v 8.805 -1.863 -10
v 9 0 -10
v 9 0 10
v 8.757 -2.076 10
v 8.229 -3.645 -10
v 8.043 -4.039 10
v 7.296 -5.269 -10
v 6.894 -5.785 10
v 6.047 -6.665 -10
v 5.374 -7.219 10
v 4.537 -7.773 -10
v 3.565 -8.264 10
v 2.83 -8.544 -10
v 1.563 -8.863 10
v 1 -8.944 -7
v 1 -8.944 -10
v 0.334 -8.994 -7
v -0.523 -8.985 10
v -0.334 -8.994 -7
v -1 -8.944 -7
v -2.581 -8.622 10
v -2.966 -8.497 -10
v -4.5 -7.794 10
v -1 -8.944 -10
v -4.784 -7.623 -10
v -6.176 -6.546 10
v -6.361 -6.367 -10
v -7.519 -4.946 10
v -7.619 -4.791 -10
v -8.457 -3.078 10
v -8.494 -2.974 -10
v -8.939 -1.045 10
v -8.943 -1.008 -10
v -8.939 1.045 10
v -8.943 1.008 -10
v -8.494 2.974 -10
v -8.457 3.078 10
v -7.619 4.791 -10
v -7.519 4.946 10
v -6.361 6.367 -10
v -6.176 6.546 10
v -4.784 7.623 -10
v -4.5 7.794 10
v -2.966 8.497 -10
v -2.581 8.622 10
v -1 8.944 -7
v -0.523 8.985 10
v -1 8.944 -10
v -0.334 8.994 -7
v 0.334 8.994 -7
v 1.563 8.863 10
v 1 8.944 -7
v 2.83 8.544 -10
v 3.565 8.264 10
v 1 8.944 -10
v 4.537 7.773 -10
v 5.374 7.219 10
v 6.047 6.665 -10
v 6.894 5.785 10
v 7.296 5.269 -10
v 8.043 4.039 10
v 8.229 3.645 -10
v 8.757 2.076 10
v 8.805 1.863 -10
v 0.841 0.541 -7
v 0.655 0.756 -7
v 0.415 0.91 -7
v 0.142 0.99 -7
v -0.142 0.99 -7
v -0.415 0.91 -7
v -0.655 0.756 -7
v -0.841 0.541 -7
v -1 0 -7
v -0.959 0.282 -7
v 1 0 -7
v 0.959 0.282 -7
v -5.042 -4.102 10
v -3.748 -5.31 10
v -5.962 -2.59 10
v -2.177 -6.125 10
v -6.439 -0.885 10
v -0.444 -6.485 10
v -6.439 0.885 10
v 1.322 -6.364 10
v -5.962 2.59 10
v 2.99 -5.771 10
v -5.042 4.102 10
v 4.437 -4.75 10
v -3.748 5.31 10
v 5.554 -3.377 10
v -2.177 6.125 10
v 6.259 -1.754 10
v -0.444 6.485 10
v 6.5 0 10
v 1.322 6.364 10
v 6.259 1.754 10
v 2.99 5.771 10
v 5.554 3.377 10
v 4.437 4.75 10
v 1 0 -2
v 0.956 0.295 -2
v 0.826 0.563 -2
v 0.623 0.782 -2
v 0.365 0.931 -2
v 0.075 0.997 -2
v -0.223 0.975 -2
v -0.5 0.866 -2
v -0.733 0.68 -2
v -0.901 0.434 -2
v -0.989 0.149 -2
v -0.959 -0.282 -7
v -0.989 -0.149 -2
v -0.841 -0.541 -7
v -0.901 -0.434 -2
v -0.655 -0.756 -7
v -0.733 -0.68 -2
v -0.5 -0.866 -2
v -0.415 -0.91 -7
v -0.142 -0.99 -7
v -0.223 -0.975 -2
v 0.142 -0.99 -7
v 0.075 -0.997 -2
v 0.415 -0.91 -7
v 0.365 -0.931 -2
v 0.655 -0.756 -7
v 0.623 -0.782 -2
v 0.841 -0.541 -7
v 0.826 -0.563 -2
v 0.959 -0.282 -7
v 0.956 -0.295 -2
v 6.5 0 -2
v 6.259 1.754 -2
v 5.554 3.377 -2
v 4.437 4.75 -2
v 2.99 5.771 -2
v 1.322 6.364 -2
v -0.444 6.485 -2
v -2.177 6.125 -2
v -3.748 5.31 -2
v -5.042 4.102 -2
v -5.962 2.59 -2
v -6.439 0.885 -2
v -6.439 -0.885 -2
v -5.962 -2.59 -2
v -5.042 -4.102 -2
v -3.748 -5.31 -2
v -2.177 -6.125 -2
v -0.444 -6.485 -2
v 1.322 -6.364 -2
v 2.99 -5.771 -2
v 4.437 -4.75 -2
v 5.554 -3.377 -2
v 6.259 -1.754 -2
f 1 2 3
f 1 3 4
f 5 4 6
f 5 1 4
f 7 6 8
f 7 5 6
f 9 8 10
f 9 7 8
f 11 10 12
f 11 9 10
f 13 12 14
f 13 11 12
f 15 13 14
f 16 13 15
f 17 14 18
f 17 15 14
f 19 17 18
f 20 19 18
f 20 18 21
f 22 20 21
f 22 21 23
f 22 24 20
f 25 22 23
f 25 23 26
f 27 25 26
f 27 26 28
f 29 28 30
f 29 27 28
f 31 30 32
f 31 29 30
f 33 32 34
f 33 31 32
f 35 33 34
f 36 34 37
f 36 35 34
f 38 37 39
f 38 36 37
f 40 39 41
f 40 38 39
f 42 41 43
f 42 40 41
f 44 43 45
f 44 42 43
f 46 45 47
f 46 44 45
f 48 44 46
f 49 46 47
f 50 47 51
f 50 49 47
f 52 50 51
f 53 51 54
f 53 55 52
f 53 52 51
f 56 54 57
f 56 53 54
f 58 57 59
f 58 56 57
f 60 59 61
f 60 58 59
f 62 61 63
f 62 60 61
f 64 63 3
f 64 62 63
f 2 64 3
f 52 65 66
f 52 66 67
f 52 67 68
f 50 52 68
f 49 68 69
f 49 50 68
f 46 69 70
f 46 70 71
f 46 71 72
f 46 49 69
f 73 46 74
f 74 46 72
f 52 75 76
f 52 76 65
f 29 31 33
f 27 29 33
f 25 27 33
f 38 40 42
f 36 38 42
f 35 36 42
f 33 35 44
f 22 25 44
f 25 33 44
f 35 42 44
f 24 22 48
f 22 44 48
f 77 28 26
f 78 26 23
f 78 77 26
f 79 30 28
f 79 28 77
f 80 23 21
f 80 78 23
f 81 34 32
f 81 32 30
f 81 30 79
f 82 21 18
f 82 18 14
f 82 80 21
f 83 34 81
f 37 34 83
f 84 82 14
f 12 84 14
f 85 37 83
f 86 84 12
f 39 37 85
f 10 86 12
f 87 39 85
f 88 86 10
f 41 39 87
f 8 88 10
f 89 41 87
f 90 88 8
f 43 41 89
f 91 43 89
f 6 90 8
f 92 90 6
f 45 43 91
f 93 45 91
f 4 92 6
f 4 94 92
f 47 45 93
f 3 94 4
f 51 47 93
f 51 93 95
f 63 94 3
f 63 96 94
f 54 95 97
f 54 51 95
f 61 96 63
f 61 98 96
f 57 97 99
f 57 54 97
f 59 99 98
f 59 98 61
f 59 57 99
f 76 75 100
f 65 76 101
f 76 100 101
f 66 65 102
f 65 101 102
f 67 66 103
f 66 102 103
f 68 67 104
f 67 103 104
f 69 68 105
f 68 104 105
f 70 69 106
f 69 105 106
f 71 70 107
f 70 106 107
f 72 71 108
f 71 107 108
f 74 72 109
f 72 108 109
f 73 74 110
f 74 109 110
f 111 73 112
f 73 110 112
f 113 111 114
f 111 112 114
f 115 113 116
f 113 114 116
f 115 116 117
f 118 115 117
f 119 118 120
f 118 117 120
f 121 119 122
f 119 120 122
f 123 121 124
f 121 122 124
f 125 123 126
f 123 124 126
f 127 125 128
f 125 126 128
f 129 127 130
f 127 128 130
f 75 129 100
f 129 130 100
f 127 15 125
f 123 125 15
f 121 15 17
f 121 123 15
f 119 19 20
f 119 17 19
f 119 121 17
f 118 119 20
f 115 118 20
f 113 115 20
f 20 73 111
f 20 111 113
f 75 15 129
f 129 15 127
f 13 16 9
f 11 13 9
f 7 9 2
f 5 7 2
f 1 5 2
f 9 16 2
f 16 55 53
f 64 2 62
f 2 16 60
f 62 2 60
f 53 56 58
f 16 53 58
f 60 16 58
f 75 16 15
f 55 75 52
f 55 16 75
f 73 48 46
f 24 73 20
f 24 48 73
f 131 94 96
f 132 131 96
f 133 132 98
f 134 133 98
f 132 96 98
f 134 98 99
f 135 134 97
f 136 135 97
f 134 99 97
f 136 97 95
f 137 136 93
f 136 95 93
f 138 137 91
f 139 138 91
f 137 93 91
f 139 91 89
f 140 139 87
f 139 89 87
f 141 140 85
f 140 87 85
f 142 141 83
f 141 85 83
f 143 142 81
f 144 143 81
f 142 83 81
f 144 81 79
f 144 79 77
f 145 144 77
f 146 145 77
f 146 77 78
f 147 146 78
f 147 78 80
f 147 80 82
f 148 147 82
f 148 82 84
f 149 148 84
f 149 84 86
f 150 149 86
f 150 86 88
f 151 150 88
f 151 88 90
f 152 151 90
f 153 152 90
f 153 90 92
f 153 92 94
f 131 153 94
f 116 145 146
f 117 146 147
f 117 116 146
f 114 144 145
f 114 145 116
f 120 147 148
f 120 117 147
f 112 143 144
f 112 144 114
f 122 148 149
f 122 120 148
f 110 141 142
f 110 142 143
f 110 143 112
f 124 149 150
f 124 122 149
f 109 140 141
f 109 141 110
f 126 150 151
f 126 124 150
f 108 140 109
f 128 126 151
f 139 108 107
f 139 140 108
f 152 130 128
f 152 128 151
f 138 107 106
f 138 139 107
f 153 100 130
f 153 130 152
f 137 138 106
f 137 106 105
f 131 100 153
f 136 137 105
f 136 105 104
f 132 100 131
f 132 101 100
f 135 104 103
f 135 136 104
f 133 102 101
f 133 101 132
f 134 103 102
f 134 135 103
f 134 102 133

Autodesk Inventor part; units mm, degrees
ref_plane "YZ Plane" through (0, 0, 0) normal (1, 0, 0) x (0, 1, 0)
ref_plane "XZ Plane" through (0, 0, 0) normal (0, 1, 0) x (-1, 0, 0)
ref_plane "XY Plane" through (0, 0, 0) normal (0, 0, 1) x (1, 0, 0)
sketch "スケッチ1" plane through (0, 0, 0) normal (0, 0, 1) x (1, 0, 0)
  circle A0 centre (0, 0) radius 9
  circle A1 centre (0, 0) radius 1
  dimension "d0" = 18
  dimension "d3" = 2
extrude "押し出し1" add sketch "スケッチ1" along normal mid plane 20
sketch "スケッチ2" plane through (0, 0, -10) normal (0, 0, -1) x (-1, 0, 0)
  line L0 (-1, 10.2383) -> (1, 10.2383)
  line L1 (1, 10.2383) -> (1, -10.4548)
  line L2 (1, -10.4548) -> (-1, -10.4548)
  line L3 (-1, -10.4548) -> (-1, 10.2383)
  point P0 (0, 0)
  point P1 (0, -10.4548)
  dimension "d4" = 2
extrude "押し出し2" cut sketch "スケッチ2" against normal blind 3
thread "ねじ1" size "M20x2" class "6g" standard "ISO Metric profile" full length
sketch "スケッチ3" plane through (0, 0, 10) normal (0, 0, 1) x (1, 0, 0)
  point P0 (0, 0)
sketch "スケッチ4" plane through (0, 0, 10) normal (0, 0, 1) x (1, 0, 0)
  circle A0 centre (0, 0) radius 6.5
  dimension "d9" = 13
extrude "押し出し3" cut sketch "スケッチ4" against normal blind 12
properties part number "rod330_end_screw" material "ステンレス鋼"
